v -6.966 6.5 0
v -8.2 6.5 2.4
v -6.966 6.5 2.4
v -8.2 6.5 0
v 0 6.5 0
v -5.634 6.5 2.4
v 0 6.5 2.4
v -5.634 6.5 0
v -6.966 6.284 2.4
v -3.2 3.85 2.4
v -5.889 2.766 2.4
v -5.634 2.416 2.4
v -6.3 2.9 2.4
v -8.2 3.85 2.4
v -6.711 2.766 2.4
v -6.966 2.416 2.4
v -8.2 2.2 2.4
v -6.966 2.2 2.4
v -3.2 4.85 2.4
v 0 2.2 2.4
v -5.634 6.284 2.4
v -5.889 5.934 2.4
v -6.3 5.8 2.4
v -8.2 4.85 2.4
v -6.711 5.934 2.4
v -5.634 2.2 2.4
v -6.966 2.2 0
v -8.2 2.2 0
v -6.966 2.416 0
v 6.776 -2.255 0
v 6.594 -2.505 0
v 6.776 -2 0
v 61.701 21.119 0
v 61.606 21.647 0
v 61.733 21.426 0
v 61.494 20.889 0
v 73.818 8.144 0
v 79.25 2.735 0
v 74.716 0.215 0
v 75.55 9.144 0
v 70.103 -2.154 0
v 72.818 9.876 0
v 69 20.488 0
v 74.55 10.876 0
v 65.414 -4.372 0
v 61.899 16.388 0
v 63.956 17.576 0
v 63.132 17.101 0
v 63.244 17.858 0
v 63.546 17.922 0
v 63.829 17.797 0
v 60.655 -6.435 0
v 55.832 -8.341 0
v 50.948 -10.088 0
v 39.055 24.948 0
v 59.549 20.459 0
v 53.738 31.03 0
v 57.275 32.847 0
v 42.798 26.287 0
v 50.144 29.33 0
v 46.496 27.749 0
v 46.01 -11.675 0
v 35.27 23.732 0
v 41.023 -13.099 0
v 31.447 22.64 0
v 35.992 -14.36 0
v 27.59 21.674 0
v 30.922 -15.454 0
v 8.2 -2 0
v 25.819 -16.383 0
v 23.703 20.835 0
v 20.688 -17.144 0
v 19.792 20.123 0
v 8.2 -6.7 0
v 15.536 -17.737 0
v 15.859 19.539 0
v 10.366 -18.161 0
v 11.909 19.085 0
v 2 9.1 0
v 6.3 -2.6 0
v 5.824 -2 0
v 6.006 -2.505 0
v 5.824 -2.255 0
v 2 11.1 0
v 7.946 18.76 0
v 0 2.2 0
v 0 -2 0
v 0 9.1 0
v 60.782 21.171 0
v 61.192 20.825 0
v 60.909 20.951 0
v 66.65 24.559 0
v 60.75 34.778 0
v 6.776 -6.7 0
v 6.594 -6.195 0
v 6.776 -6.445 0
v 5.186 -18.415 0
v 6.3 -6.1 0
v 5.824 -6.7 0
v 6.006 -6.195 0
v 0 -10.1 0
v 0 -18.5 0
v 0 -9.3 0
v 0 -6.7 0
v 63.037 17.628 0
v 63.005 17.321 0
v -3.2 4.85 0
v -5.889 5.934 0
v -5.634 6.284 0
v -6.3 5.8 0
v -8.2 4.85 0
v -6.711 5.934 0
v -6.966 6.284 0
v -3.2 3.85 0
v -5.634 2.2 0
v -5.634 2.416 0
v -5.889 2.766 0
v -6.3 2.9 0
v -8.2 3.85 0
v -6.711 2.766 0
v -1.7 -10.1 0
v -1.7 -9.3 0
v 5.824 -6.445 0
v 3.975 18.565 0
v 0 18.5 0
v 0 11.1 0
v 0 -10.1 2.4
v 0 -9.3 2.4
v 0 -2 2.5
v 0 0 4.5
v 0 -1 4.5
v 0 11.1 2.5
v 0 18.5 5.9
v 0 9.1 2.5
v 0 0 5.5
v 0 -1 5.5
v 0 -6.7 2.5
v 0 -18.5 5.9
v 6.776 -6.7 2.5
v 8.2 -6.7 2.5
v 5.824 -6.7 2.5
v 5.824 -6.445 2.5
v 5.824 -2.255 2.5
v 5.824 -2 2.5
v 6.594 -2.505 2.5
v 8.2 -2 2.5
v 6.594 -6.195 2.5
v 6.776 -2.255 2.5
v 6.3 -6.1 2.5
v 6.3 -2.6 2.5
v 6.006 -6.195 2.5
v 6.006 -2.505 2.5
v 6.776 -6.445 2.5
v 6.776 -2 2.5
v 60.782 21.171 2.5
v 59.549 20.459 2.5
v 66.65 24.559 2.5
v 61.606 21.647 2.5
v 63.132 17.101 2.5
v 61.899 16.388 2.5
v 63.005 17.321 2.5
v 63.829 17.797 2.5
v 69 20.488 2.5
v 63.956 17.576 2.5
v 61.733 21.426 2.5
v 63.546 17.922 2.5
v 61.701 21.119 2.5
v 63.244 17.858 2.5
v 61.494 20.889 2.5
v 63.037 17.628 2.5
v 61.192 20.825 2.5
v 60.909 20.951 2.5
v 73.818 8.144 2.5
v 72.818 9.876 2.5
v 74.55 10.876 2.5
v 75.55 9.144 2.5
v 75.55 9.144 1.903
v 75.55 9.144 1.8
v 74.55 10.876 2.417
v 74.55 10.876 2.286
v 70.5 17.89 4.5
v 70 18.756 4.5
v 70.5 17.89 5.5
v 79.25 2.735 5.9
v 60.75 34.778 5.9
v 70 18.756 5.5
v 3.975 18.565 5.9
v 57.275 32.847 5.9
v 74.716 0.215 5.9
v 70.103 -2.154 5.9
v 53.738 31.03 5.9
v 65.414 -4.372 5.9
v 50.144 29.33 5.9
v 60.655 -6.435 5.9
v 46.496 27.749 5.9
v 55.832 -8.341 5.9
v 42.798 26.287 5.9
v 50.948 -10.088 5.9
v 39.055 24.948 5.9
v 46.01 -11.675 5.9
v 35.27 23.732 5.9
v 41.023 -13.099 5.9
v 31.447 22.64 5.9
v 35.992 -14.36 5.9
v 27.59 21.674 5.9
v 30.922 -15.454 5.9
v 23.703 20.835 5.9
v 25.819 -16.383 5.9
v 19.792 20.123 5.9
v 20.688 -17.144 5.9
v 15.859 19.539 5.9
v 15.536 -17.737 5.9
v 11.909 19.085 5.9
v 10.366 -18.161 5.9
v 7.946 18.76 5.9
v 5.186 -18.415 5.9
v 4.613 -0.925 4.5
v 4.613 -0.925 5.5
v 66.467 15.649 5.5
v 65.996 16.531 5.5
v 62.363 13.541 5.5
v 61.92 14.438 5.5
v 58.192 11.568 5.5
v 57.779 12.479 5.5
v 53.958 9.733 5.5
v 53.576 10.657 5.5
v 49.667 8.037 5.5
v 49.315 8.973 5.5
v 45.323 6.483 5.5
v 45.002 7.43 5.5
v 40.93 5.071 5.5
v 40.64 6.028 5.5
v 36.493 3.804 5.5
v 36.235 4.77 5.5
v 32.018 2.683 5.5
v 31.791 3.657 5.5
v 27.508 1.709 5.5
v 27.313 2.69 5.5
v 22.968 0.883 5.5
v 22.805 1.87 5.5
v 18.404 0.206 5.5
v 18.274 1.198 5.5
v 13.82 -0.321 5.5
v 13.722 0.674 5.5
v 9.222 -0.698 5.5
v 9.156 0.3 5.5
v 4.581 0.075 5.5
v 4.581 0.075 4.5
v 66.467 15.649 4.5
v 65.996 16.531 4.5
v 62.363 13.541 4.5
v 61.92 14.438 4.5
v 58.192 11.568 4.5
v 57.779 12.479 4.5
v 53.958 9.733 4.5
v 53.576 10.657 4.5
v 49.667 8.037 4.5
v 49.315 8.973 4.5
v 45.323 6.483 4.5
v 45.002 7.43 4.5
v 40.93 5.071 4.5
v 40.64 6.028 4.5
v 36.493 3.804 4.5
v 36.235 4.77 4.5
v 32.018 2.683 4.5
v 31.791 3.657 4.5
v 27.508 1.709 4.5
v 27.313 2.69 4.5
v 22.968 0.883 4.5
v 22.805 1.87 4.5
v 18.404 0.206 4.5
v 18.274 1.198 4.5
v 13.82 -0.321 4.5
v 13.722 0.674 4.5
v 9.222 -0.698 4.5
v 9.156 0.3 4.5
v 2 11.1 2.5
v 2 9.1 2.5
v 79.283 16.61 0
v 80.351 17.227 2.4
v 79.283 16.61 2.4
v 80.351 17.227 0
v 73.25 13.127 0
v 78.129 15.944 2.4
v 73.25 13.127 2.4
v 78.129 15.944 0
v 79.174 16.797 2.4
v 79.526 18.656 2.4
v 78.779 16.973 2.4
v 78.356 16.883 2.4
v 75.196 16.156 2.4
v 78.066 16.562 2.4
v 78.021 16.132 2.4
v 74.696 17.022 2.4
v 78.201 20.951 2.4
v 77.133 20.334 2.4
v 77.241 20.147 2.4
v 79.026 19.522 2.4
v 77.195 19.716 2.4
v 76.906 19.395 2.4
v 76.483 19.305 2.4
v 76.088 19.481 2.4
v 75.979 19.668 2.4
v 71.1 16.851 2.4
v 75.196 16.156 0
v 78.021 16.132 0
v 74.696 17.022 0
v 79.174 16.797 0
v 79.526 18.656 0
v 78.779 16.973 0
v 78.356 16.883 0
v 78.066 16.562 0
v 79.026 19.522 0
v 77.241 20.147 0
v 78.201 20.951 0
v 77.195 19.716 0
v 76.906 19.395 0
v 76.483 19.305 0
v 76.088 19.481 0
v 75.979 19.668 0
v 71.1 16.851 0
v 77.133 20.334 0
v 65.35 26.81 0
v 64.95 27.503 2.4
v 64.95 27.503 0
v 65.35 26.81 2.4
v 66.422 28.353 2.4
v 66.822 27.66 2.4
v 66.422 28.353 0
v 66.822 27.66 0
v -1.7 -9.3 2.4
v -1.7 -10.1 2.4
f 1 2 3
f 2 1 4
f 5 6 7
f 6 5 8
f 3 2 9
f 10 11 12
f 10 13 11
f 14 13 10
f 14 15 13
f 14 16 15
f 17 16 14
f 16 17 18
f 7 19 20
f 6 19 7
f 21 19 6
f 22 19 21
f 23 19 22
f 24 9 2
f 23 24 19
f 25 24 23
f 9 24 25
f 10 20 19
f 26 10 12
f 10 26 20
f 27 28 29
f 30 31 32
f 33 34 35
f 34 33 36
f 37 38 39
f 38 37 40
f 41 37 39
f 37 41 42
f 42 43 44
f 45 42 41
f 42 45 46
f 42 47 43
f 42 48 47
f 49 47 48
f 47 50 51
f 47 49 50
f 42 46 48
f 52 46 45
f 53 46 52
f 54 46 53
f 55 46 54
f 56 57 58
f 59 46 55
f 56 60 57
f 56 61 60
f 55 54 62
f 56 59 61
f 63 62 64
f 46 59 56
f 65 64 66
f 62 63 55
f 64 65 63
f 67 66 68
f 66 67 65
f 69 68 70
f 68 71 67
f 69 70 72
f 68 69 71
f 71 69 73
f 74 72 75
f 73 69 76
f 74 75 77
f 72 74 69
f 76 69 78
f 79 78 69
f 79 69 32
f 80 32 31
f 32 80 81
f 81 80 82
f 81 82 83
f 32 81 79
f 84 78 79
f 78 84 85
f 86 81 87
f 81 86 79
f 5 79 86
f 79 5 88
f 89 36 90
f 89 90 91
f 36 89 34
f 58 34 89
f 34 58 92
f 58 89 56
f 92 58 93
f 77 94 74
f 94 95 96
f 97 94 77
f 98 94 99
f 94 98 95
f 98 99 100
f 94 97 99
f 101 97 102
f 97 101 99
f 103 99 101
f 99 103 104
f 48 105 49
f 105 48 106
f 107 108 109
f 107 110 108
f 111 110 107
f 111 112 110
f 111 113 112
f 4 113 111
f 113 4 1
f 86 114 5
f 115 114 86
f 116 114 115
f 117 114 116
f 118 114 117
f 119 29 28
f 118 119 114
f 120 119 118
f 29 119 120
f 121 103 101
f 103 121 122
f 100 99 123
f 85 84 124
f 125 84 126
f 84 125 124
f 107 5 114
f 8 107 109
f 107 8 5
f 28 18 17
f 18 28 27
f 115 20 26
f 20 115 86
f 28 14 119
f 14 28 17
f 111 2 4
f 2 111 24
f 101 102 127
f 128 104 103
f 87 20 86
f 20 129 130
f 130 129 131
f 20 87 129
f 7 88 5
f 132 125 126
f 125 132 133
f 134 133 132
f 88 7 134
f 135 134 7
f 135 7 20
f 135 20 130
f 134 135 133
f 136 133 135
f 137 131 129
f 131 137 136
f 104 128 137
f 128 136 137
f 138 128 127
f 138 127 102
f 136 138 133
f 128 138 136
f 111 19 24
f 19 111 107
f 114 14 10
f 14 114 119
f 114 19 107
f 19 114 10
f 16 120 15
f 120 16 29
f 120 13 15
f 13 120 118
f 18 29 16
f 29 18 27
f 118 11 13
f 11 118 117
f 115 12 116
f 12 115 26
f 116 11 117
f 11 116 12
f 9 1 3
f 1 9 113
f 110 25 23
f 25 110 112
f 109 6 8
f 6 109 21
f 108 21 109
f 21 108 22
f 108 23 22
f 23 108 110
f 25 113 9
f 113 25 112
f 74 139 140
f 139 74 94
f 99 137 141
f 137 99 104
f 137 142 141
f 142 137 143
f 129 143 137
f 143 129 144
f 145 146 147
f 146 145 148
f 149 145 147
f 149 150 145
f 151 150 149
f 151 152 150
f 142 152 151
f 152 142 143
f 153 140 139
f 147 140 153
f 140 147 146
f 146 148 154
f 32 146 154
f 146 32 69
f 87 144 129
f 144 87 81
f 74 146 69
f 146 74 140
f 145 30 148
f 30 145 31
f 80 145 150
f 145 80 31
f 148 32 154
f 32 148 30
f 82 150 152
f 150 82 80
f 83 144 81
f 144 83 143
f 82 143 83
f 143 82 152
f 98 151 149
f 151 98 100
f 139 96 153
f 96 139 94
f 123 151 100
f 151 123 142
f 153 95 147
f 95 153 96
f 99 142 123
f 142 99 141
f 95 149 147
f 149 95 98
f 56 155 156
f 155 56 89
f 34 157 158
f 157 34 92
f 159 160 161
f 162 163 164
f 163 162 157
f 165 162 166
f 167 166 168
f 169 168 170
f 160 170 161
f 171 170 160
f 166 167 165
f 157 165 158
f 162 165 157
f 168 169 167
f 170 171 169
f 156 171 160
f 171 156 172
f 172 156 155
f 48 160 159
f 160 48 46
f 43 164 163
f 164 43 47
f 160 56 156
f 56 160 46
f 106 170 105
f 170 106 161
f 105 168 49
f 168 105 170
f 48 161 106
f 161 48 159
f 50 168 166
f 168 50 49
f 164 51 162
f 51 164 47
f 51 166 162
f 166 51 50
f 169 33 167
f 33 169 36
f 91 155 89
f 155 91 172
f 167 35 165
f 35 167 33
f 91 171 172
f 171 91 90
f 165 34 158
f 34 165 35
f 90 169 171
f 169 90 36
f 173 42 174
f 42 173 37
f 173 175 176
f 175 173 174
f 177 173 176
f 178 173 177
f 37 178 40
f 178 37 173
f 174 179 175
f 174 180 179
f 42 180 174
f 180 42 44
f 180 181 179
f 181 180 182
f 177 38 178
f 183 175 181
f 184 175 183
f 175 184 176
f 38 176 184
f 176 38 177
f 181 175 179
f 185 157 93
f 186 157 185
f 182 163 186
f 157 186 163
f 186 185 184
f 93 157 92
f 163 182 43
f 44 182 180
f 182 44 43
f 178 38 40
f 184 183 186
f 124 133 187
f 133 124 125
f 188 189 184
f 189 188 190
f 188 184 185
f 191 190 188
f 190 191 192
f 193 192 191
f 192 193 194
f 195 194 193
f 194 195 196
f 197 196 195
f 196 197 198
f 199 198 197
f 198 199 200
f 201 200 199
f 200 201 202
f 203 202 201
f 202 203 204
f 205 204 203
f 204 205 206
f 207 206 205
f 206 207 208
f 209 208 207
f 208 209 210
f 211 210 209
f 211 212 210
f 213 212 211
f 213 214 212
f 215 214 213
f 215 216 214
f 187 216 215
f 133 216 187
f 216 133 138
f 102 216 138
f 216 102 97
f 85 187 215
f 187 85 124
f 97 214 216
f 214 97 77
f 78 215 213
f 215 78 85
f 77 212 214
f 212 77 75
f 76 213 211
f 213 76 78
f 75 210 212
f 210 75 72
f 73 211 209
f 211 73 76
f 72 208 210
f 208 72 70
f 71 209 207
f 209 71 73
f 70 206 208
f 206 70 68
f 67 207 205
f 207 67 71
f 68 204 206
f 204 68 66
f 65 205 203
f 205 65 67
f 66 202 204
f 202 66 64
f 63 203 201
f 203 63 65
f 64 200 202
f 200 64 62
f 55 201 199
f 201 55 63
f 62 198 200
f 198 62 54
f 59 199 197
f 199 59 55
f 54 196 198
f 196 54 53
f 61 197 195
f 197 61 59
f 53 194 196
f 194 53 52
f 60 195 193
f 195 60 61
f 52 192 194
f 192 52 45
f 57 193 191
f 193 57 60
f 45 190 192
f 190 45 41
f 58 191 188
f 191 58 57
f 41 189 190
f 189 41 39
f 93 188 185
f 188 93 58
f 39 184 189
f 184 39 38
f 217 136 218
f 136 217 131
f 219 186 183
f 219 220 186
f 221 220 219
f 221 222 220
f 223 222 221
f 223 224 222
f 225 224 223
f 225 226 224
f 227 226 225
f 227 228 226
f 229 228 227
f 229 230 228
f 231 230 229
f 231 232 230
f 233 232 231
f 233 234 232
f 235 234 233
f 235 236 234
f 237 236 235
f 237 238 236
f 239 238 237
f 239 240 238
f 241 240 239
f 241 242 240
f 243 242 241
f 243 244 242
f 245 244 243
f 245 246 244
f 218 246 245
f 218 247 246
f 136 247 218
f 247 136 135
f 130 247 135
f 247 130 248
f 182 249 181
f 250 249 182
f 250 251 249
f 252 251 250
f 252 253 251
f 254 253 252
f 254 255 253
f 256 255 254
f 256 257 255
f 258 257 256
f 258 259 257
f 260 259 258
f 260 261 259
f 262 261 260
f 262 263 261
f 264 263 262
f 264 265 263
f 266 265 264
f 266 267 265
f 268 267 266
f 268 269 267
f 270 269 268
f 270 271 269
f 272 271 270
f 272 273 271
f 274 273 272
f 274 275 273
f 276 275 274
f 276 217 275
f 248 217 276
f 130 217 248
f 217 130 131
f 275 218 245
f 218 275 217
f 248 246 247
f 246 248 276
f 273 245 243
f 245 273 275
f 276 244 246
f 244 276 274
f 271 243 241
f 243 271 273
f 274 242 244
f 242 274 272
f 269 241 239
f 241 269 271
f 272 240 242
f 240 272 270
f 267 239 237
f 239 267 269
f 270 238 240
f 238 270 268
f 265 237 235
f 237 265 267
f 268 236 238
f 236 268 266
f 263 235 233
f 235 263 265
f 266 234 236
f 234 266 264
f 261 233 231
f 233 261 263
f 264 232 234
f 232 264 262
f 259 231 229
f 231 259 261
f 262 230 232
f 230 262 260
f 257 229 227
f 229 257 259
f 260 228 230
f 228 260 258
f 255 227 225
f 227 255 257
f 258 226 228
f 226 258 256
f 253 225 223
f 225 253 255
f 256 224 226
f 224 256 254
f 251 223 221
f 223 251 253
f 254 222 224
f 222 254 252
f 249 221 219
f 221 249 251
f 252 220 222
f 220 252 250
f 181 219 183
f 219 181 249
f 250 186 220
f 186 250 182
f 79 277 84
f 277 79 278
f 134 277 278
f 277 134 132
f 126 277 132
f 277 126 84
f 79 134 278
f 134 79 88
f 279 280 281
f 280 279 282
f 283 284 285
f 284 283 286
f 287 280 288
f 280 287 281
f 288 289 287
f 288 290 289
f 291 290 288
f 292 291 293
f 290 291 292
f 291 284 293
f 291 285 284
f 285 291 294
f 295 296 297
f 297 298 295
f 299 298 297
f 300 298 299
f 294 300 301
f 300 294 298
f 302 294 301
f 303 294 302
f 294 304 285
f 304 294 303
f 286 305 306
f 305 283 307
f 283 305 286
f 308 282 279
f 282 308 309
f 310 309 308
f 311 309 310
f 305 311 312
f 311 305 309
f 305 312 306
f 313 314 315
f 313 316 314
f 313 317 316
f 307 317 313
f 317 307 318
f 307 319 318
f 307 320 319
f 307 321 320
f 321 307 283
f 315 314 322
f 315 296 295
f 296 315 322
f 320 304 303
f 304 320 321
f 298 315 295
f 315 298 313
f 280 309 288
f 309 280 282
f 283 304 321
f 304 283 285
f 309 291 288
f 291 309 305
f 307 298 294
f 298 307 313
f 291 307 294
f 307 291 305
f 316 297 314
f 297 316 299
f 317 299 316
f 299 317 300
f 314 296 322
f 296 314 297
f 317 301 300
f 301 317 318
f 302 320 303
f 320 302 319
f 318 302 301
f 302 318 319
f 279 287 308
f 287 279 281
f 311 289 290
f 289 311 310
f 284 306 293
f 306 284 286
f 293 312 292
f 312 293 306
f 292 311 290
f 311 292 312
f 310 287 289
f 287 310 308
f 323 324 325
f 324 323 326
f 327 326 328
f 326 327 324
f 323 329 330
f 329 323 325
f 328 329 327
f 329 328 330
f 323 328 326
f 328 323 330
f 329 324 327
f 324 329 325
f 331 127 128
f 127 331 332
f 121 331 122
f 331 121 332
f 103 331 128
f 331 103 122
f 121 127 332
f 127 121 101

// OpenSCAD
road_height = 5.9;
road_width  = 37;

wire_width = 0.9;

plug_distance = 8.7;
liner_distance = 19;





module add_interface(x_offset, r, angle){
    translate([0,plug_distance/2,0])
    rotate([0,0,90])
    plug();

    translate([-1.7,-liner_distance/2-1+0.4,0])
    cube([1.7,0.8,2.4]);
    
    difference(){
        children();
        
        translate([0,-plug_distance/2,0])
        rotate([0,0,-90])
        #plug_hole();
        
        translate([0,liner_distance/2-0.4,0])
        #cube([2,2,2.5]);
        
        translate([0,r,0])
        rotate([0,0,angle])
        translate([x_offset,-r,0])
        rotate([0,0,180]){
        translate([0,-plug_distance/2,0])
        rotate([0,0,-90])
        #plug_hole();
            
        translate([0,liner_distance/2-0.4,0])
        #cube([2,2,2.5]);
        }
    }
    
    translate([0,r,0])
    rotate([0,0,angle])
    translate([x_offset,-r,0])
    rotate([0,0,180])
    {
    translate([0,plug_distance/2,0])
    rotate([0,0,90])
    plug();
        
    translate([-1.7,-liner_distance/2-1+0.4,0])
    cube([1.7,0.8,2.4]);
    }

}

add_interface(0, 140, 30)

translate([0,140,0])
rotate([0,0,-90])
rotate_extrude(angle=30, $fn=200)
translate([140,0,0])
difference(){
    translate([-road_width/2,0,0])
    square([road_width,road_height]);

    #translate([0,road_height-1-0.4,0])
    square([1,1]);

}



module plug_hole(){
    translate([-4.7/2,0,0])
    difference(){
    cube([4.7,8.2,2.5]);
        
    translate([0.1,6.3,-0.5])
    cylinder(3, 0.5, 0.5, $fn=10);
    
    translate([4.6,6.3,-0.5])
    cylinder(3, 0.5, 0.5, $fn=10);
    }
}

module plug(){
    translate([-4.3/2,0,0])
    difference(){
        cube([4.3,8.2,2.4]);
        translate([(4.3-1)/2,8.2-5,-0.5])
        cube([1,8.2,2.4+1]);
        
        translate([0,6.3,-0.5])
        cylinder(3, 0.7, 0.7, $fn=10);
        
        translate([4.3,6.3,-0.5])
        cylinder(3, 0.7, 0.7, $fn=10);
    }
}
